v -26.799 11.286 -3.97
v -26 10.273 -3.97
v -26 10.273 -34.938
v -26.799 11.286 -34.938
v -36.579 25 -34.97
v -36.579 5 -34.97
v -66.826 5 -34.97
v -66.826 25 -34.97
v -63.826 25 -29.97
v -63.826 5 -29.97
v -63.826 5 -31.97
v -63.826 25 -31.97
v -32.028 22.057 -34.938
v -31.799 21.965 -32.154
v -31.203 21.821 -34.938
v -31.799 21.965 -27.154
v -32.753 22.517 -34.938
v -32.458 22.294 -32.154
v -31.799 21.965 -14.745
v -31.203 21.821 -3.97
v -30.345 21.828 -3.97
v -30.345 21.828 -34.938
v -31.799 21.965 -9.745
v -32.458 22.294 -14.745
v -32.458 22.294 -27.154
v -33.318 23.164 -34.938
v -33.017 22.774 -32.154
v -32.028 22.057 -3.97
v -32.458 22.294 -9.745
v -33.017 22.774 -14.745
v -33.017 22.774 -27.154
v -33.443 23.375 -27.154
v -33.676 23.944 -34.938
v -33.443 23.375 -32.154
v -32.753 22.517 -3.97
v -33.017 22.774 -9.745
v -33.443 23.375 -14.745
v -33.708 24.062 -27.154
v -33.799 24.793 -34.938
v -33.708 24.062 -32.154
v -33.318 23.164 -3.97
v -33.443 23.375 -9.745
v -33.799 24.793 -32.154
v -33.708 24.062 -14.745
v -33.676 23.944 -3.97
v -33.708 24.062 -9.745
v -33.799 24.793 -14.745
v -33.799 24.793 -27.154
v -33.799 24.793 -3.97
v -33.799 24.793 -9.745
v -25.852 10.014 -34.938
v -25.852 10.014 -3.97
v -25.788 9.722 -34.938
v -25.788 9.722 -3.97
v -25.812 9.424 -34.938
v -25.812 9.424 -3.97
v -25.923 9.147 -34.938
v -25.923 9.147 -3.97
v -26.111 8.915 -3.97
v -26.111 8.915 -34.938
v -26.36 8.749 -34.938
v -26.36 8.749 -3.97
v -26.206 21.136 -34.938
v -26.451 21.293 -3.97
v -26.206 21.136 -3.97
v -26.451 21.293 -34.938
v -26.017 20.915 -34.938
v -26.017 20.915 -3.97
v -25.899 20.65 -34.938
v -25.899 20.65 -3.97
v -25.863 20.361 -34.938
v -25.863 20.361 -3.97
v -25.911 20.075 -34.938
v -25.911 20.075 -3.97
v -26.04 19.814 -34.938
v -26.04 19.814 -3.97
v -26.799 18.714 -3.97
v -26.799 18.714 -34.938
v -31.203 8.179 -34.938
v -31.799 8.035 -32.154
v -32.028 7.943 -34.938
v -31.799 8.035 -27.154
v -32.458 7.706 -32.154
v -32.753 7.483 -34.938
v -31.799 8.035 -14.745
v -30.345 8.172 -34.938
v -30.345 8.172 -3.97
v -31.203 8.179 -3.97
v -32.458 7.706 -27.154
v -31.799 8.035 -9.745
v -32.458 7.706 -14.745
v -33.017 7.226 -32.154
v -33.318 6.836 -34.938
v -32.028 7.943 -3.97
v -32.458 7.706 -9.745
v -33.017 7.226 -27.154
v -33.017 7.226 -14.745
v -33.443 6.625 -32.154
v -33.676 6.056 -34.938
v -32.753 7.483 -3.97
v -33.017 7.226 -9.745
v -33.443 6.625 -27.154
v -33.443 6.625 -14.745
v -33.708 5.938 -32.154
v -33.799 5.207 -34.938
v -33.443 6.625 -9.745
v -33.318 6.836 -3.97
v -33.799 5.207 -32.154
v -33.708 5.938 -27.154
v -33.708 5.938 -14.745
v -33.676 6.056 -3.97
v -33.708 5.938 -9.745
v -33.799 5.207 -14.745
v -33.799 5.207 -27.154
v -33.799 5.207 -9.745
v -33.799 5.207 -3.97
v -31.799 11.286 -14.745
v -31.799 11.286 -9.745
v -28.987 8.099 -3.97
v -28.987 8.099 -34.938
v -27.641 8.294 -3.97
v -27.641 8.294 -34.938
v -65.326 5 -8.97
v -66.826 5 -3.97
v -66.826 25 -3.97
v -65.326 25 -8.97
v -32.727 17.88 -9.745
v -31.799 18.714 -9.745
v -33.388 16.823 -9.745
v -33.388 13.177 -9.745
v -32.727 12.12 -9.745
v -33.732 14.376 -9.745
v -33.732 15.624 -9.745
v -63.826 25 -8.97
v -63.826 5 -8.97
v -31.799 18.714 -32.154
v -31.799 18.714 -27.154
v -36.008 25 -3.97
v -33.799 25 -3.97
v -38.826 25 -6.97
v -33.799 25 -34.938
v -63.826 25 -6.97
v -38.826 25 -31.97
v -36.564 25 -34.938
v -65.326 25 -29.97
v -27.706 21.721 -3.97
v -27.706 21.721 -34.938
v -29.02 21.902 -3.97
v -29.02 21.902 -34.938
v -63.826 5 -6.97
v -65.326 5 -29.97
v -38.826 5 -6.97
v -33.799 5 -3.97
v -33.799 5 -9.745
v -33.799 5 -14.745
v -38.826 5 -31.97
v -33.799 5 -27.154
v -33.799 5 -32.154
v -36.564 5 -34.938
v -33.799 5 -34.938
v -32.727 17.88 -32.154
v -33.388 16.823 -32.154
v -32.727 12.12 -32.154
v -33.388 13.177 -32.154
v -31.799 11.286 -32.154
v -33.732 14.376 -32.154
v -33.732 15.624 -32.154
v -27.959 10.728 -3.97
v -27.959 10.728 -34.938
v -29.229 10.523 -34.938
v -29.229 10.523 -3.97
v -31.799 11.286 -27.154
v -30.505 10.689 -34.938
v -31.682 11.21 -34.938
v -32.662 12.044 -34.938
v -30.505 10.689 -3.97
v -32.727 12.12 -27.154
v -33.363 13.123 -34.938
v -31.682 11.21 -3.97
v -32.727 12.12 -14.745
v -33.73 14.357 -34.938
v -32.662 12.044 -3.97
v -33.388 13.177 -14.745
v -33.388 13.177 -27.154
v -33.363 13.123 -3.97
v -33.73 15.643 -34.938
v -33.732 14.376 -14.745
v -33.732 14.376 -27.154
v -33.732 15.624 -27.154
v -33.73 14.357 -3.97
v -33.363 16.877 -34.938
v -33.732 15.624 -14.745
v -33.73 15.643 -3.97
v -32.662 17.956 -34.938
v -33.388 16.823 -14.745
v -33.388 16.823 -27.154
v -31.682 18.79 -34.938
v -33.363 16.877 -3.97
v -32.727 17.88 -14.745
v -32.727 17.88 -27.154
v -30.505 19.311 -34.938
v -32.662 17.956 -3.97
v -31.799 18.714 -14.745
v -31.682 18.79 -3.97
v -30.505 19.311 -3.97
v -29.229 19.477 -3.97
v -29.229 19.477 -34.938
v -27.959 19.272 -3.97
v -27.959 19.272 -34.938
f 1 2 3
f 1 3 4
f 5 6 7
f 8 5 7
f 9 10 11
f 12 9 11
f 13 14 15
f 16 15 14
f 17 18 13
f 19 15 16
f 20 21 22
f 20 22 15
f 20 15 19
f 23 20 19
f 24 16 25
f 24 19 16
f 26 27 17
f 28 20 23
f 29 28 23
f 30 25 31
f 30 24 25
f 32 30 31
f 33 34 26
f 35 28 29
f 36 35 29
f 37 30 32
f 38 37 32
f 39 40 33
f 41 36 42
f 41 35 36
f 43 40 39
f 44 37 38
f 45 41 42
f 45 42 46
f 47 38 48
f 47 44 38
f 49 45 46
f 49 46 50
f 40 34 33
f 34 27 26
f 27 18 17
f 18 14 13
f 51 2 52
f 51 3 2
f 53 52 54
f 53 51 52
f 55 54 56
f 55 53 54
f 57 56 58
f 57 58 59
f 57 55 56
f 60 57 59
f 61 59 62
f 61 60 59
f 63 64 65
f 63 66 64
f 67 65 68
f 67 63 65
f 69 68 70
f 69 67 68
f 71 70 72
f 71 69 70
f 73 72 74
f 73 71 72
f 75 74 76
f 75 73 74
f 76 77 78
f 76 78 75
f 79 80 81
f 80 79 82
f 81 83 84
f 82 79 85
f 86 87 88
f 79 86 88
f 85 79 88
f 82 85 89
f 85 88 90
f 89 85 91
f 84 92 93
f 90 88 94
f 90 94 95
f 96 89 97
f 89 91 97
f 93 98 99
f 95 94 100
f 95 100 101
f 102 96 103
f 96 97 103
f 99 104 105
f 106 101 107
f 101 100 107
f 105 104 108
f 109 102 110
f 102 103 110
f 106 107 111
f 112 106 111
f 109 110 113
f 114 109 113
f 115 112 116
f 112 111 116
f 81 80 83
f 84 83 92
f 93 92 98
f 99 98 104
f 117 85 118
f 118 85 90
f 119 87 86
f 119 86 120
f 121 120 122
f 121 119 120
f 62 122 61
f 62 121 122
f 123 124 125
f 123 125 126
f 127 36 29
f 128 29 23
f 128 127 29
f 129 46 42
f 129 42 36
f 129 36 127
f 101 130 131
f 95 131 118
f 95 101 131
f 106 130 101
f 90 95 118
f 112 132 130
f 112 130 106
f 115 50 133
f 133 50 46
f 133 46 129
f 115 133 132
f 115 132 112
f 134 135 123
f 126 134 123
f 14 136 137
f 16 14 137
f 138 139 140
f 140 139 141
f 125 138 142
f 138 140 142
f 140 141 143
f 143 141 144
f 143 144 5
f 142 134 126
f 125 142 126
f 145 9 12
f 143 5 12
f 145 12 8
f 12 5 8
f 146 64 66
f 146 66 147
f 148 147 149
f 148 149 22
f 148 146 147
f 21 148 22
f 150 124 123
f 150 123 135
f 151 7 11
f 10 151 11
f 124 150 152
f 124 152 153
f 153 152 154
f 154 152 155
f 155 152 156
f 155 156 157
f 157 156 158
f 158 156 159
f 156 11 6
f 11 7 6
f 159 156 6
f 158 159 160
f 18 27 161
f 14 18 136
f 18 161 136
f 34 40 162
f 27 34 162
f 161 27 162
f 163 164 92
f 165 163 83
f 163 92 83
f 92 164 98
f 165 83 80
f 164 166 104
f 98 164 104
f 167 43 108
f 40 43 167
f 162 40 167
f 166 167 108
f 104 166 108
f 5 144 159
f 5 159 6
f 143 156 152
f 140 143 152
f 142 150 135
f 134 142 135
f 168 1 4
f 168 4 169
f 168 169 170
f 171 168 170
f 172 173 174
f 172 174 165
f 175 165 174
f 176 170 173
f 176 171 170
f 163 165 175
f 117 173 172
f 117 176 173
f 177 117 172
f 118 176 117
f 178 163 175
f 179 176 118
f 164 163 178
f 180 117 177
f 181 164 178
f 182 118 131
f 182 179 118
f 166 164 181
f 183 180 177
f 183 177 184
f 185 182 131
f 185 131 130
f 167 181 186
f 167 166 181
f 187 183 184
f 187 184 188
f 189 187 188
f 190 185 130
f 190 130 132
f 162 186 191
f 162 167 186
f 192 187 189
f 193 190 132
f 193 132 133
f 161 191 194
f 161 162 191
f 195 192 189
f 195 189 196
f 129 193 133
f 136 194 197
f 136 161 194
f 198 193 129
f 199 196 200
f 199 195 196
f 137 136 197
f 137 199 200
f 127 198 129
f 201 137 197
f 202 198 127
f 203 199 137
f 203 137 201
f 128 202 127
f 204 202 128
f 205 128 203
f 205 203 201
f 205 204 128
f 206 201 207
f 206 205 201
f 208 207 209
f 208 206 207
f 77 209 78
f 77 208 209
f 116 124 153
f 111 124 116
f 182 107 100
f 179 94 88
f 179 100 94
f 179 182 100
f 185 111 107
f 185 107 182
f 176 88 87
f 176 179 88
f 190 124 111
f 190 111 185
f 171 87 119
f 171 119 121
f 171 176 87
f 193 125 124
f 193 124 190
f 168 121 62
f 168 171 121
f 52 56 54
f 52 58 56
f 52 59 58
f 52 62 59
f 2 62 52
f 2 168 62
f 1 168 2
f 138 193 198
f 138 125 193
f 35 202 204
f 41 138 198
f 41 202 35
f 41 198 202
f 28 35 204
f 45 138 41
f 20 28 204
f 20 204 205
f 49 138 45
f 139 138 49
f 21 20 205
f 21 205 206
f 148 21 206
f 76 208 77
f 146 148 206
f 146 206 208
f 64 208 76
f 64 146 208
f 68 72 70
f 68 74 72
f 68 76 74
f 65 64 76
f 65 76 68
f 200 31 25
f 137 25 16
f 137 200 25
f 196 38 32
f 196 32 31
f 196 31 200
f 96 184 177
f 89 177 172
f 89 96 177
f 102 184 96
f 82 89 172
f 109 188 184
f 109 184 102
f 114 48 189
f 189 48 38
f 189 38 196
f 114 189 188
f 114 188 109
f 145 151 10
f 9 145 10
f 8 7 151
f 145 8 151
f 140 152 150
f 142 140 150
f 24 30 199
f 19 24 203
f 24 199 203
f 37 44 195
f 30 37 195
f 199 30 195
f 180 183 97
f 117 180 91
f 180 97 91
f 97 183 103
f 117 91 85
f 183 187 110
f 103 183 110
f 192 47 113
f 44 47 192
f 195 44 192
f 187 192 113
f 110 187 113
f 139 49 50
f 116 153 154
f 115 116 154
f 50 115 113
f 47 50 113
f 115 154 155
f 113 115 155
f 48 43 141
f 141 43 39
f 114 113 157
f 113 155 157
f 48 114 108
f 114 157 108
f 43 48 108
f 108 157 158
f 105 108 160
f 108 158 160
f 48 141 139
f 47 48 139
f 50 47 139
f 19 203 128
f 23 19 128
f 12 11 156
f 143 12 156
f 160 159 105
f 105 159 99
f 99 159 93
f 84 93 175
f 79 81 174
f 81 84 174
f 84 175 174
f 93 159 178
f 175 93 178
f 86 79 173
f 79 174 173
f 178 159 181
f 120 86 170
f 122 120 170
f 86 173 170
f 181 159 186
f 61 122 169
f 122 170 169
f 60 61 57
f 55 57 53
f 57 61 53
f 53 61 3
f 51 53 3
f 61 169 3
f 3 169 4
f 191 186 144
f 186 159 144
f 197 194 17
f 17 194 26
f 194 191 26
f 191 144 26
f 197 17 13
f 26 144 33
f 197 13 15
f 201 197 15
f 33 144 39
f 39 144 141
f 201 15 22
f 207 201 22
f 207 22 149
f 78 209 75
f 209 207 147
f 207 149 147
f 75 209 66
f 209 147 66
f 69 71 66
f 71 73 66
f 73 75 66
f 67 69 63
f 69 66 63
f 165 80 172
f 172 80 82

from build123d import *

# Parameters (mm, degrees)
EXTRUDE_1_DEPTH           = 25
CUT_EXTRUDE_4_DEPTH       = 80.457942189
SKETCH_7_W                = 16.60831278
SKETCH_7_H                = 38.473598513
CUT_EXTRUDE_14_DEPTH      = 80.457942189
SKETCH_8_W                = 5
SKETCH_8_H                = 30.968526609
EXTRUDE_2_DEPTH           = 25
CUT_EXTRUDE_15_DEPTH      = 78.792556685
CUT_EXTRUDE_15_DEPTH_BACK = 78.792556685
SKETCH_9_W                = 33.026813651
SKETCH_9_H                = 5
EXTRUDE_3_DEPTH           = 30.968526609
FILLET_1_R                = 3
FILLET_2_R                = 1
SKETCH_11_W               = 2
SKETCH_11_H               = 5
CUT_EXTRUDE_16_DEPTH      = 79.029254622


with BuildPart() as part:
    # Эскиз1 → Бобышка-Вытянуть1 (new body)
    with BuildSketch(Plane(origin=(0, 0, 0), x_dir=(1, 0, 0), z_dir=(0, 1, 0))):
        Polygon((-66.825757576, 34.969739794), (-66.825757576, 29.969739794), (-63.825757576, 29.969739794), (-63.825757576, 31.969739794), (-38.825757576, 31.969739794), (-38.825757576, 6.969739794), (-63.825757576, 6.969739794), (-63.825757576, 8.969739794), (-66.825757576, 8.969739794), (-66.825757576, 3.969739794), (-22.123470102, 3.969739794), (-36.579007505, 34.969739794), align=None)
    extrude(amount=EXTRUDE_1_DEPTH)

    # Эскиз3 → Вырез-Вытянуть4 (cut, through all)
    with BuildSketch(Plane.XZ):
        Polygon((-66.825757576, -3.969739794), (-65.325757576, -8.969739794), (-66.825757576, -8.969739794), align=None)
        Polygon((-66.825757576, -29.969739794), (-66.825757576, -34.969739794), (-65.325757576, -29.969739794), align=None)
    extrude(amount=-CUT_EXTRUDE_4_DEPTH, mode=Mode.SUBTRACT)

    # Эскиз7 → Вырез-Вытянуть14 (cut, through all)
    with BuildSketch(Plane(origin=(0, 0, 0), x_dir=(-1, 0, 0), z_dir=(0, -1, 0))):
        with Locations((27.703474463, 20.539743139)):
            Rectangle(SKETCH_7_W, SKETCH_7_H)
    extrude(amount=-CUT_EXTRUDE_14_DEPTH, mode=Mode.SUBTRACT)

    # Эскиз8 → Бобышка-Вытянуть2 (add)
    with BuildSketch(Plane(origin=(0, 0, 0), x_dir=(-1, 0, 0), z_dir=(0, -1, 0))):
        with Locations((36.298943925, 19.454003098)):
            Rectangle(SKETCH_8_W, SKETCH_8_H)
    extrude(amount=-EXTRUDE_2_DEPTH)

    # Эскиз9 → Вырез-Вытянуть15 (cut, two sides: drawn at the far end of the back side and taken through both)
    with BuildSketch(Plane.XY.offset(-3.969739794).offset(-CUT_EXTRUDE_15_DEPTH_BACK)):
        with Locations((-50.312350751, 2.5)):
            Rectangle(SKETCH_9_W, SKETCH_9_H)
    extrude(amount=CUT_EXTRUDE_15_DEPTH + CUT_EXTRUDE_15_DEPTH_BACK, mode=Mode.SUBTRACT)

    # Эскиз10 → Бобышка-Вытянуть3 (add)
    with BuildSketch(Plane.XY.offset(-3.969739794)):
        with BuildLine():
            Line((-26.798943925, 18.714044563), (-25.41833427, 20.714562355))
            ThreePointArc((-25.41833427, 20.714562355), (-36.206138223, 14.922403986), (-25.290934081, 9.374059074))
            Line((-25.290934081, 9.374059074), (-26.798943925, 11.285955437))
            ThreePointArc((-26.798943925, 11.285955437), (-33.776010712, 15), (-26.798943925, 18.714044563))
        make_face()
    extrude(amount=-EXTRUDE_3_DEPTH)

    # Скругление1
    fillet_1_edges = [part.edges().sort_by_distance(p)[0] for p in [
        (-33.798943925, 9.759260146, -19.454003099),
        (-33.798943925, 20.240739854, -19.454003099),
    ]]
    fillet(fillet_1_edges, radius=FILLET_1_R)

    # Скругление2
    fillet_2_edges = [part.edges().sort_by_distance(p)[0] for p in [
        (-25.41833427, 20.714562355, -19.454003099),
        (-25.290934081, 9.374059074, -19.454003099),
    ]]
    fillet(fillet_2_edges, radius=FILLET_2_R)

    # Эскиз11 → Вырез-Вытянуть16 (cut, through all)
    with BuildSketch(Plane.XZ.offset(-5)):
        with Locations((-32.798943925, -12.244728029)):
            Rectangle(SKETCH_11_W, SKETCH_11_H)
        with Locations((-32.798943925, -29.654311708)):
            Rectangle(SKETCH_11_W, SKETCH_11_H)
    extrude(amount=-CUT_EXTRUDE_16_DEPTH, mode=Mode.SUBTRACT)


solid = part.part
